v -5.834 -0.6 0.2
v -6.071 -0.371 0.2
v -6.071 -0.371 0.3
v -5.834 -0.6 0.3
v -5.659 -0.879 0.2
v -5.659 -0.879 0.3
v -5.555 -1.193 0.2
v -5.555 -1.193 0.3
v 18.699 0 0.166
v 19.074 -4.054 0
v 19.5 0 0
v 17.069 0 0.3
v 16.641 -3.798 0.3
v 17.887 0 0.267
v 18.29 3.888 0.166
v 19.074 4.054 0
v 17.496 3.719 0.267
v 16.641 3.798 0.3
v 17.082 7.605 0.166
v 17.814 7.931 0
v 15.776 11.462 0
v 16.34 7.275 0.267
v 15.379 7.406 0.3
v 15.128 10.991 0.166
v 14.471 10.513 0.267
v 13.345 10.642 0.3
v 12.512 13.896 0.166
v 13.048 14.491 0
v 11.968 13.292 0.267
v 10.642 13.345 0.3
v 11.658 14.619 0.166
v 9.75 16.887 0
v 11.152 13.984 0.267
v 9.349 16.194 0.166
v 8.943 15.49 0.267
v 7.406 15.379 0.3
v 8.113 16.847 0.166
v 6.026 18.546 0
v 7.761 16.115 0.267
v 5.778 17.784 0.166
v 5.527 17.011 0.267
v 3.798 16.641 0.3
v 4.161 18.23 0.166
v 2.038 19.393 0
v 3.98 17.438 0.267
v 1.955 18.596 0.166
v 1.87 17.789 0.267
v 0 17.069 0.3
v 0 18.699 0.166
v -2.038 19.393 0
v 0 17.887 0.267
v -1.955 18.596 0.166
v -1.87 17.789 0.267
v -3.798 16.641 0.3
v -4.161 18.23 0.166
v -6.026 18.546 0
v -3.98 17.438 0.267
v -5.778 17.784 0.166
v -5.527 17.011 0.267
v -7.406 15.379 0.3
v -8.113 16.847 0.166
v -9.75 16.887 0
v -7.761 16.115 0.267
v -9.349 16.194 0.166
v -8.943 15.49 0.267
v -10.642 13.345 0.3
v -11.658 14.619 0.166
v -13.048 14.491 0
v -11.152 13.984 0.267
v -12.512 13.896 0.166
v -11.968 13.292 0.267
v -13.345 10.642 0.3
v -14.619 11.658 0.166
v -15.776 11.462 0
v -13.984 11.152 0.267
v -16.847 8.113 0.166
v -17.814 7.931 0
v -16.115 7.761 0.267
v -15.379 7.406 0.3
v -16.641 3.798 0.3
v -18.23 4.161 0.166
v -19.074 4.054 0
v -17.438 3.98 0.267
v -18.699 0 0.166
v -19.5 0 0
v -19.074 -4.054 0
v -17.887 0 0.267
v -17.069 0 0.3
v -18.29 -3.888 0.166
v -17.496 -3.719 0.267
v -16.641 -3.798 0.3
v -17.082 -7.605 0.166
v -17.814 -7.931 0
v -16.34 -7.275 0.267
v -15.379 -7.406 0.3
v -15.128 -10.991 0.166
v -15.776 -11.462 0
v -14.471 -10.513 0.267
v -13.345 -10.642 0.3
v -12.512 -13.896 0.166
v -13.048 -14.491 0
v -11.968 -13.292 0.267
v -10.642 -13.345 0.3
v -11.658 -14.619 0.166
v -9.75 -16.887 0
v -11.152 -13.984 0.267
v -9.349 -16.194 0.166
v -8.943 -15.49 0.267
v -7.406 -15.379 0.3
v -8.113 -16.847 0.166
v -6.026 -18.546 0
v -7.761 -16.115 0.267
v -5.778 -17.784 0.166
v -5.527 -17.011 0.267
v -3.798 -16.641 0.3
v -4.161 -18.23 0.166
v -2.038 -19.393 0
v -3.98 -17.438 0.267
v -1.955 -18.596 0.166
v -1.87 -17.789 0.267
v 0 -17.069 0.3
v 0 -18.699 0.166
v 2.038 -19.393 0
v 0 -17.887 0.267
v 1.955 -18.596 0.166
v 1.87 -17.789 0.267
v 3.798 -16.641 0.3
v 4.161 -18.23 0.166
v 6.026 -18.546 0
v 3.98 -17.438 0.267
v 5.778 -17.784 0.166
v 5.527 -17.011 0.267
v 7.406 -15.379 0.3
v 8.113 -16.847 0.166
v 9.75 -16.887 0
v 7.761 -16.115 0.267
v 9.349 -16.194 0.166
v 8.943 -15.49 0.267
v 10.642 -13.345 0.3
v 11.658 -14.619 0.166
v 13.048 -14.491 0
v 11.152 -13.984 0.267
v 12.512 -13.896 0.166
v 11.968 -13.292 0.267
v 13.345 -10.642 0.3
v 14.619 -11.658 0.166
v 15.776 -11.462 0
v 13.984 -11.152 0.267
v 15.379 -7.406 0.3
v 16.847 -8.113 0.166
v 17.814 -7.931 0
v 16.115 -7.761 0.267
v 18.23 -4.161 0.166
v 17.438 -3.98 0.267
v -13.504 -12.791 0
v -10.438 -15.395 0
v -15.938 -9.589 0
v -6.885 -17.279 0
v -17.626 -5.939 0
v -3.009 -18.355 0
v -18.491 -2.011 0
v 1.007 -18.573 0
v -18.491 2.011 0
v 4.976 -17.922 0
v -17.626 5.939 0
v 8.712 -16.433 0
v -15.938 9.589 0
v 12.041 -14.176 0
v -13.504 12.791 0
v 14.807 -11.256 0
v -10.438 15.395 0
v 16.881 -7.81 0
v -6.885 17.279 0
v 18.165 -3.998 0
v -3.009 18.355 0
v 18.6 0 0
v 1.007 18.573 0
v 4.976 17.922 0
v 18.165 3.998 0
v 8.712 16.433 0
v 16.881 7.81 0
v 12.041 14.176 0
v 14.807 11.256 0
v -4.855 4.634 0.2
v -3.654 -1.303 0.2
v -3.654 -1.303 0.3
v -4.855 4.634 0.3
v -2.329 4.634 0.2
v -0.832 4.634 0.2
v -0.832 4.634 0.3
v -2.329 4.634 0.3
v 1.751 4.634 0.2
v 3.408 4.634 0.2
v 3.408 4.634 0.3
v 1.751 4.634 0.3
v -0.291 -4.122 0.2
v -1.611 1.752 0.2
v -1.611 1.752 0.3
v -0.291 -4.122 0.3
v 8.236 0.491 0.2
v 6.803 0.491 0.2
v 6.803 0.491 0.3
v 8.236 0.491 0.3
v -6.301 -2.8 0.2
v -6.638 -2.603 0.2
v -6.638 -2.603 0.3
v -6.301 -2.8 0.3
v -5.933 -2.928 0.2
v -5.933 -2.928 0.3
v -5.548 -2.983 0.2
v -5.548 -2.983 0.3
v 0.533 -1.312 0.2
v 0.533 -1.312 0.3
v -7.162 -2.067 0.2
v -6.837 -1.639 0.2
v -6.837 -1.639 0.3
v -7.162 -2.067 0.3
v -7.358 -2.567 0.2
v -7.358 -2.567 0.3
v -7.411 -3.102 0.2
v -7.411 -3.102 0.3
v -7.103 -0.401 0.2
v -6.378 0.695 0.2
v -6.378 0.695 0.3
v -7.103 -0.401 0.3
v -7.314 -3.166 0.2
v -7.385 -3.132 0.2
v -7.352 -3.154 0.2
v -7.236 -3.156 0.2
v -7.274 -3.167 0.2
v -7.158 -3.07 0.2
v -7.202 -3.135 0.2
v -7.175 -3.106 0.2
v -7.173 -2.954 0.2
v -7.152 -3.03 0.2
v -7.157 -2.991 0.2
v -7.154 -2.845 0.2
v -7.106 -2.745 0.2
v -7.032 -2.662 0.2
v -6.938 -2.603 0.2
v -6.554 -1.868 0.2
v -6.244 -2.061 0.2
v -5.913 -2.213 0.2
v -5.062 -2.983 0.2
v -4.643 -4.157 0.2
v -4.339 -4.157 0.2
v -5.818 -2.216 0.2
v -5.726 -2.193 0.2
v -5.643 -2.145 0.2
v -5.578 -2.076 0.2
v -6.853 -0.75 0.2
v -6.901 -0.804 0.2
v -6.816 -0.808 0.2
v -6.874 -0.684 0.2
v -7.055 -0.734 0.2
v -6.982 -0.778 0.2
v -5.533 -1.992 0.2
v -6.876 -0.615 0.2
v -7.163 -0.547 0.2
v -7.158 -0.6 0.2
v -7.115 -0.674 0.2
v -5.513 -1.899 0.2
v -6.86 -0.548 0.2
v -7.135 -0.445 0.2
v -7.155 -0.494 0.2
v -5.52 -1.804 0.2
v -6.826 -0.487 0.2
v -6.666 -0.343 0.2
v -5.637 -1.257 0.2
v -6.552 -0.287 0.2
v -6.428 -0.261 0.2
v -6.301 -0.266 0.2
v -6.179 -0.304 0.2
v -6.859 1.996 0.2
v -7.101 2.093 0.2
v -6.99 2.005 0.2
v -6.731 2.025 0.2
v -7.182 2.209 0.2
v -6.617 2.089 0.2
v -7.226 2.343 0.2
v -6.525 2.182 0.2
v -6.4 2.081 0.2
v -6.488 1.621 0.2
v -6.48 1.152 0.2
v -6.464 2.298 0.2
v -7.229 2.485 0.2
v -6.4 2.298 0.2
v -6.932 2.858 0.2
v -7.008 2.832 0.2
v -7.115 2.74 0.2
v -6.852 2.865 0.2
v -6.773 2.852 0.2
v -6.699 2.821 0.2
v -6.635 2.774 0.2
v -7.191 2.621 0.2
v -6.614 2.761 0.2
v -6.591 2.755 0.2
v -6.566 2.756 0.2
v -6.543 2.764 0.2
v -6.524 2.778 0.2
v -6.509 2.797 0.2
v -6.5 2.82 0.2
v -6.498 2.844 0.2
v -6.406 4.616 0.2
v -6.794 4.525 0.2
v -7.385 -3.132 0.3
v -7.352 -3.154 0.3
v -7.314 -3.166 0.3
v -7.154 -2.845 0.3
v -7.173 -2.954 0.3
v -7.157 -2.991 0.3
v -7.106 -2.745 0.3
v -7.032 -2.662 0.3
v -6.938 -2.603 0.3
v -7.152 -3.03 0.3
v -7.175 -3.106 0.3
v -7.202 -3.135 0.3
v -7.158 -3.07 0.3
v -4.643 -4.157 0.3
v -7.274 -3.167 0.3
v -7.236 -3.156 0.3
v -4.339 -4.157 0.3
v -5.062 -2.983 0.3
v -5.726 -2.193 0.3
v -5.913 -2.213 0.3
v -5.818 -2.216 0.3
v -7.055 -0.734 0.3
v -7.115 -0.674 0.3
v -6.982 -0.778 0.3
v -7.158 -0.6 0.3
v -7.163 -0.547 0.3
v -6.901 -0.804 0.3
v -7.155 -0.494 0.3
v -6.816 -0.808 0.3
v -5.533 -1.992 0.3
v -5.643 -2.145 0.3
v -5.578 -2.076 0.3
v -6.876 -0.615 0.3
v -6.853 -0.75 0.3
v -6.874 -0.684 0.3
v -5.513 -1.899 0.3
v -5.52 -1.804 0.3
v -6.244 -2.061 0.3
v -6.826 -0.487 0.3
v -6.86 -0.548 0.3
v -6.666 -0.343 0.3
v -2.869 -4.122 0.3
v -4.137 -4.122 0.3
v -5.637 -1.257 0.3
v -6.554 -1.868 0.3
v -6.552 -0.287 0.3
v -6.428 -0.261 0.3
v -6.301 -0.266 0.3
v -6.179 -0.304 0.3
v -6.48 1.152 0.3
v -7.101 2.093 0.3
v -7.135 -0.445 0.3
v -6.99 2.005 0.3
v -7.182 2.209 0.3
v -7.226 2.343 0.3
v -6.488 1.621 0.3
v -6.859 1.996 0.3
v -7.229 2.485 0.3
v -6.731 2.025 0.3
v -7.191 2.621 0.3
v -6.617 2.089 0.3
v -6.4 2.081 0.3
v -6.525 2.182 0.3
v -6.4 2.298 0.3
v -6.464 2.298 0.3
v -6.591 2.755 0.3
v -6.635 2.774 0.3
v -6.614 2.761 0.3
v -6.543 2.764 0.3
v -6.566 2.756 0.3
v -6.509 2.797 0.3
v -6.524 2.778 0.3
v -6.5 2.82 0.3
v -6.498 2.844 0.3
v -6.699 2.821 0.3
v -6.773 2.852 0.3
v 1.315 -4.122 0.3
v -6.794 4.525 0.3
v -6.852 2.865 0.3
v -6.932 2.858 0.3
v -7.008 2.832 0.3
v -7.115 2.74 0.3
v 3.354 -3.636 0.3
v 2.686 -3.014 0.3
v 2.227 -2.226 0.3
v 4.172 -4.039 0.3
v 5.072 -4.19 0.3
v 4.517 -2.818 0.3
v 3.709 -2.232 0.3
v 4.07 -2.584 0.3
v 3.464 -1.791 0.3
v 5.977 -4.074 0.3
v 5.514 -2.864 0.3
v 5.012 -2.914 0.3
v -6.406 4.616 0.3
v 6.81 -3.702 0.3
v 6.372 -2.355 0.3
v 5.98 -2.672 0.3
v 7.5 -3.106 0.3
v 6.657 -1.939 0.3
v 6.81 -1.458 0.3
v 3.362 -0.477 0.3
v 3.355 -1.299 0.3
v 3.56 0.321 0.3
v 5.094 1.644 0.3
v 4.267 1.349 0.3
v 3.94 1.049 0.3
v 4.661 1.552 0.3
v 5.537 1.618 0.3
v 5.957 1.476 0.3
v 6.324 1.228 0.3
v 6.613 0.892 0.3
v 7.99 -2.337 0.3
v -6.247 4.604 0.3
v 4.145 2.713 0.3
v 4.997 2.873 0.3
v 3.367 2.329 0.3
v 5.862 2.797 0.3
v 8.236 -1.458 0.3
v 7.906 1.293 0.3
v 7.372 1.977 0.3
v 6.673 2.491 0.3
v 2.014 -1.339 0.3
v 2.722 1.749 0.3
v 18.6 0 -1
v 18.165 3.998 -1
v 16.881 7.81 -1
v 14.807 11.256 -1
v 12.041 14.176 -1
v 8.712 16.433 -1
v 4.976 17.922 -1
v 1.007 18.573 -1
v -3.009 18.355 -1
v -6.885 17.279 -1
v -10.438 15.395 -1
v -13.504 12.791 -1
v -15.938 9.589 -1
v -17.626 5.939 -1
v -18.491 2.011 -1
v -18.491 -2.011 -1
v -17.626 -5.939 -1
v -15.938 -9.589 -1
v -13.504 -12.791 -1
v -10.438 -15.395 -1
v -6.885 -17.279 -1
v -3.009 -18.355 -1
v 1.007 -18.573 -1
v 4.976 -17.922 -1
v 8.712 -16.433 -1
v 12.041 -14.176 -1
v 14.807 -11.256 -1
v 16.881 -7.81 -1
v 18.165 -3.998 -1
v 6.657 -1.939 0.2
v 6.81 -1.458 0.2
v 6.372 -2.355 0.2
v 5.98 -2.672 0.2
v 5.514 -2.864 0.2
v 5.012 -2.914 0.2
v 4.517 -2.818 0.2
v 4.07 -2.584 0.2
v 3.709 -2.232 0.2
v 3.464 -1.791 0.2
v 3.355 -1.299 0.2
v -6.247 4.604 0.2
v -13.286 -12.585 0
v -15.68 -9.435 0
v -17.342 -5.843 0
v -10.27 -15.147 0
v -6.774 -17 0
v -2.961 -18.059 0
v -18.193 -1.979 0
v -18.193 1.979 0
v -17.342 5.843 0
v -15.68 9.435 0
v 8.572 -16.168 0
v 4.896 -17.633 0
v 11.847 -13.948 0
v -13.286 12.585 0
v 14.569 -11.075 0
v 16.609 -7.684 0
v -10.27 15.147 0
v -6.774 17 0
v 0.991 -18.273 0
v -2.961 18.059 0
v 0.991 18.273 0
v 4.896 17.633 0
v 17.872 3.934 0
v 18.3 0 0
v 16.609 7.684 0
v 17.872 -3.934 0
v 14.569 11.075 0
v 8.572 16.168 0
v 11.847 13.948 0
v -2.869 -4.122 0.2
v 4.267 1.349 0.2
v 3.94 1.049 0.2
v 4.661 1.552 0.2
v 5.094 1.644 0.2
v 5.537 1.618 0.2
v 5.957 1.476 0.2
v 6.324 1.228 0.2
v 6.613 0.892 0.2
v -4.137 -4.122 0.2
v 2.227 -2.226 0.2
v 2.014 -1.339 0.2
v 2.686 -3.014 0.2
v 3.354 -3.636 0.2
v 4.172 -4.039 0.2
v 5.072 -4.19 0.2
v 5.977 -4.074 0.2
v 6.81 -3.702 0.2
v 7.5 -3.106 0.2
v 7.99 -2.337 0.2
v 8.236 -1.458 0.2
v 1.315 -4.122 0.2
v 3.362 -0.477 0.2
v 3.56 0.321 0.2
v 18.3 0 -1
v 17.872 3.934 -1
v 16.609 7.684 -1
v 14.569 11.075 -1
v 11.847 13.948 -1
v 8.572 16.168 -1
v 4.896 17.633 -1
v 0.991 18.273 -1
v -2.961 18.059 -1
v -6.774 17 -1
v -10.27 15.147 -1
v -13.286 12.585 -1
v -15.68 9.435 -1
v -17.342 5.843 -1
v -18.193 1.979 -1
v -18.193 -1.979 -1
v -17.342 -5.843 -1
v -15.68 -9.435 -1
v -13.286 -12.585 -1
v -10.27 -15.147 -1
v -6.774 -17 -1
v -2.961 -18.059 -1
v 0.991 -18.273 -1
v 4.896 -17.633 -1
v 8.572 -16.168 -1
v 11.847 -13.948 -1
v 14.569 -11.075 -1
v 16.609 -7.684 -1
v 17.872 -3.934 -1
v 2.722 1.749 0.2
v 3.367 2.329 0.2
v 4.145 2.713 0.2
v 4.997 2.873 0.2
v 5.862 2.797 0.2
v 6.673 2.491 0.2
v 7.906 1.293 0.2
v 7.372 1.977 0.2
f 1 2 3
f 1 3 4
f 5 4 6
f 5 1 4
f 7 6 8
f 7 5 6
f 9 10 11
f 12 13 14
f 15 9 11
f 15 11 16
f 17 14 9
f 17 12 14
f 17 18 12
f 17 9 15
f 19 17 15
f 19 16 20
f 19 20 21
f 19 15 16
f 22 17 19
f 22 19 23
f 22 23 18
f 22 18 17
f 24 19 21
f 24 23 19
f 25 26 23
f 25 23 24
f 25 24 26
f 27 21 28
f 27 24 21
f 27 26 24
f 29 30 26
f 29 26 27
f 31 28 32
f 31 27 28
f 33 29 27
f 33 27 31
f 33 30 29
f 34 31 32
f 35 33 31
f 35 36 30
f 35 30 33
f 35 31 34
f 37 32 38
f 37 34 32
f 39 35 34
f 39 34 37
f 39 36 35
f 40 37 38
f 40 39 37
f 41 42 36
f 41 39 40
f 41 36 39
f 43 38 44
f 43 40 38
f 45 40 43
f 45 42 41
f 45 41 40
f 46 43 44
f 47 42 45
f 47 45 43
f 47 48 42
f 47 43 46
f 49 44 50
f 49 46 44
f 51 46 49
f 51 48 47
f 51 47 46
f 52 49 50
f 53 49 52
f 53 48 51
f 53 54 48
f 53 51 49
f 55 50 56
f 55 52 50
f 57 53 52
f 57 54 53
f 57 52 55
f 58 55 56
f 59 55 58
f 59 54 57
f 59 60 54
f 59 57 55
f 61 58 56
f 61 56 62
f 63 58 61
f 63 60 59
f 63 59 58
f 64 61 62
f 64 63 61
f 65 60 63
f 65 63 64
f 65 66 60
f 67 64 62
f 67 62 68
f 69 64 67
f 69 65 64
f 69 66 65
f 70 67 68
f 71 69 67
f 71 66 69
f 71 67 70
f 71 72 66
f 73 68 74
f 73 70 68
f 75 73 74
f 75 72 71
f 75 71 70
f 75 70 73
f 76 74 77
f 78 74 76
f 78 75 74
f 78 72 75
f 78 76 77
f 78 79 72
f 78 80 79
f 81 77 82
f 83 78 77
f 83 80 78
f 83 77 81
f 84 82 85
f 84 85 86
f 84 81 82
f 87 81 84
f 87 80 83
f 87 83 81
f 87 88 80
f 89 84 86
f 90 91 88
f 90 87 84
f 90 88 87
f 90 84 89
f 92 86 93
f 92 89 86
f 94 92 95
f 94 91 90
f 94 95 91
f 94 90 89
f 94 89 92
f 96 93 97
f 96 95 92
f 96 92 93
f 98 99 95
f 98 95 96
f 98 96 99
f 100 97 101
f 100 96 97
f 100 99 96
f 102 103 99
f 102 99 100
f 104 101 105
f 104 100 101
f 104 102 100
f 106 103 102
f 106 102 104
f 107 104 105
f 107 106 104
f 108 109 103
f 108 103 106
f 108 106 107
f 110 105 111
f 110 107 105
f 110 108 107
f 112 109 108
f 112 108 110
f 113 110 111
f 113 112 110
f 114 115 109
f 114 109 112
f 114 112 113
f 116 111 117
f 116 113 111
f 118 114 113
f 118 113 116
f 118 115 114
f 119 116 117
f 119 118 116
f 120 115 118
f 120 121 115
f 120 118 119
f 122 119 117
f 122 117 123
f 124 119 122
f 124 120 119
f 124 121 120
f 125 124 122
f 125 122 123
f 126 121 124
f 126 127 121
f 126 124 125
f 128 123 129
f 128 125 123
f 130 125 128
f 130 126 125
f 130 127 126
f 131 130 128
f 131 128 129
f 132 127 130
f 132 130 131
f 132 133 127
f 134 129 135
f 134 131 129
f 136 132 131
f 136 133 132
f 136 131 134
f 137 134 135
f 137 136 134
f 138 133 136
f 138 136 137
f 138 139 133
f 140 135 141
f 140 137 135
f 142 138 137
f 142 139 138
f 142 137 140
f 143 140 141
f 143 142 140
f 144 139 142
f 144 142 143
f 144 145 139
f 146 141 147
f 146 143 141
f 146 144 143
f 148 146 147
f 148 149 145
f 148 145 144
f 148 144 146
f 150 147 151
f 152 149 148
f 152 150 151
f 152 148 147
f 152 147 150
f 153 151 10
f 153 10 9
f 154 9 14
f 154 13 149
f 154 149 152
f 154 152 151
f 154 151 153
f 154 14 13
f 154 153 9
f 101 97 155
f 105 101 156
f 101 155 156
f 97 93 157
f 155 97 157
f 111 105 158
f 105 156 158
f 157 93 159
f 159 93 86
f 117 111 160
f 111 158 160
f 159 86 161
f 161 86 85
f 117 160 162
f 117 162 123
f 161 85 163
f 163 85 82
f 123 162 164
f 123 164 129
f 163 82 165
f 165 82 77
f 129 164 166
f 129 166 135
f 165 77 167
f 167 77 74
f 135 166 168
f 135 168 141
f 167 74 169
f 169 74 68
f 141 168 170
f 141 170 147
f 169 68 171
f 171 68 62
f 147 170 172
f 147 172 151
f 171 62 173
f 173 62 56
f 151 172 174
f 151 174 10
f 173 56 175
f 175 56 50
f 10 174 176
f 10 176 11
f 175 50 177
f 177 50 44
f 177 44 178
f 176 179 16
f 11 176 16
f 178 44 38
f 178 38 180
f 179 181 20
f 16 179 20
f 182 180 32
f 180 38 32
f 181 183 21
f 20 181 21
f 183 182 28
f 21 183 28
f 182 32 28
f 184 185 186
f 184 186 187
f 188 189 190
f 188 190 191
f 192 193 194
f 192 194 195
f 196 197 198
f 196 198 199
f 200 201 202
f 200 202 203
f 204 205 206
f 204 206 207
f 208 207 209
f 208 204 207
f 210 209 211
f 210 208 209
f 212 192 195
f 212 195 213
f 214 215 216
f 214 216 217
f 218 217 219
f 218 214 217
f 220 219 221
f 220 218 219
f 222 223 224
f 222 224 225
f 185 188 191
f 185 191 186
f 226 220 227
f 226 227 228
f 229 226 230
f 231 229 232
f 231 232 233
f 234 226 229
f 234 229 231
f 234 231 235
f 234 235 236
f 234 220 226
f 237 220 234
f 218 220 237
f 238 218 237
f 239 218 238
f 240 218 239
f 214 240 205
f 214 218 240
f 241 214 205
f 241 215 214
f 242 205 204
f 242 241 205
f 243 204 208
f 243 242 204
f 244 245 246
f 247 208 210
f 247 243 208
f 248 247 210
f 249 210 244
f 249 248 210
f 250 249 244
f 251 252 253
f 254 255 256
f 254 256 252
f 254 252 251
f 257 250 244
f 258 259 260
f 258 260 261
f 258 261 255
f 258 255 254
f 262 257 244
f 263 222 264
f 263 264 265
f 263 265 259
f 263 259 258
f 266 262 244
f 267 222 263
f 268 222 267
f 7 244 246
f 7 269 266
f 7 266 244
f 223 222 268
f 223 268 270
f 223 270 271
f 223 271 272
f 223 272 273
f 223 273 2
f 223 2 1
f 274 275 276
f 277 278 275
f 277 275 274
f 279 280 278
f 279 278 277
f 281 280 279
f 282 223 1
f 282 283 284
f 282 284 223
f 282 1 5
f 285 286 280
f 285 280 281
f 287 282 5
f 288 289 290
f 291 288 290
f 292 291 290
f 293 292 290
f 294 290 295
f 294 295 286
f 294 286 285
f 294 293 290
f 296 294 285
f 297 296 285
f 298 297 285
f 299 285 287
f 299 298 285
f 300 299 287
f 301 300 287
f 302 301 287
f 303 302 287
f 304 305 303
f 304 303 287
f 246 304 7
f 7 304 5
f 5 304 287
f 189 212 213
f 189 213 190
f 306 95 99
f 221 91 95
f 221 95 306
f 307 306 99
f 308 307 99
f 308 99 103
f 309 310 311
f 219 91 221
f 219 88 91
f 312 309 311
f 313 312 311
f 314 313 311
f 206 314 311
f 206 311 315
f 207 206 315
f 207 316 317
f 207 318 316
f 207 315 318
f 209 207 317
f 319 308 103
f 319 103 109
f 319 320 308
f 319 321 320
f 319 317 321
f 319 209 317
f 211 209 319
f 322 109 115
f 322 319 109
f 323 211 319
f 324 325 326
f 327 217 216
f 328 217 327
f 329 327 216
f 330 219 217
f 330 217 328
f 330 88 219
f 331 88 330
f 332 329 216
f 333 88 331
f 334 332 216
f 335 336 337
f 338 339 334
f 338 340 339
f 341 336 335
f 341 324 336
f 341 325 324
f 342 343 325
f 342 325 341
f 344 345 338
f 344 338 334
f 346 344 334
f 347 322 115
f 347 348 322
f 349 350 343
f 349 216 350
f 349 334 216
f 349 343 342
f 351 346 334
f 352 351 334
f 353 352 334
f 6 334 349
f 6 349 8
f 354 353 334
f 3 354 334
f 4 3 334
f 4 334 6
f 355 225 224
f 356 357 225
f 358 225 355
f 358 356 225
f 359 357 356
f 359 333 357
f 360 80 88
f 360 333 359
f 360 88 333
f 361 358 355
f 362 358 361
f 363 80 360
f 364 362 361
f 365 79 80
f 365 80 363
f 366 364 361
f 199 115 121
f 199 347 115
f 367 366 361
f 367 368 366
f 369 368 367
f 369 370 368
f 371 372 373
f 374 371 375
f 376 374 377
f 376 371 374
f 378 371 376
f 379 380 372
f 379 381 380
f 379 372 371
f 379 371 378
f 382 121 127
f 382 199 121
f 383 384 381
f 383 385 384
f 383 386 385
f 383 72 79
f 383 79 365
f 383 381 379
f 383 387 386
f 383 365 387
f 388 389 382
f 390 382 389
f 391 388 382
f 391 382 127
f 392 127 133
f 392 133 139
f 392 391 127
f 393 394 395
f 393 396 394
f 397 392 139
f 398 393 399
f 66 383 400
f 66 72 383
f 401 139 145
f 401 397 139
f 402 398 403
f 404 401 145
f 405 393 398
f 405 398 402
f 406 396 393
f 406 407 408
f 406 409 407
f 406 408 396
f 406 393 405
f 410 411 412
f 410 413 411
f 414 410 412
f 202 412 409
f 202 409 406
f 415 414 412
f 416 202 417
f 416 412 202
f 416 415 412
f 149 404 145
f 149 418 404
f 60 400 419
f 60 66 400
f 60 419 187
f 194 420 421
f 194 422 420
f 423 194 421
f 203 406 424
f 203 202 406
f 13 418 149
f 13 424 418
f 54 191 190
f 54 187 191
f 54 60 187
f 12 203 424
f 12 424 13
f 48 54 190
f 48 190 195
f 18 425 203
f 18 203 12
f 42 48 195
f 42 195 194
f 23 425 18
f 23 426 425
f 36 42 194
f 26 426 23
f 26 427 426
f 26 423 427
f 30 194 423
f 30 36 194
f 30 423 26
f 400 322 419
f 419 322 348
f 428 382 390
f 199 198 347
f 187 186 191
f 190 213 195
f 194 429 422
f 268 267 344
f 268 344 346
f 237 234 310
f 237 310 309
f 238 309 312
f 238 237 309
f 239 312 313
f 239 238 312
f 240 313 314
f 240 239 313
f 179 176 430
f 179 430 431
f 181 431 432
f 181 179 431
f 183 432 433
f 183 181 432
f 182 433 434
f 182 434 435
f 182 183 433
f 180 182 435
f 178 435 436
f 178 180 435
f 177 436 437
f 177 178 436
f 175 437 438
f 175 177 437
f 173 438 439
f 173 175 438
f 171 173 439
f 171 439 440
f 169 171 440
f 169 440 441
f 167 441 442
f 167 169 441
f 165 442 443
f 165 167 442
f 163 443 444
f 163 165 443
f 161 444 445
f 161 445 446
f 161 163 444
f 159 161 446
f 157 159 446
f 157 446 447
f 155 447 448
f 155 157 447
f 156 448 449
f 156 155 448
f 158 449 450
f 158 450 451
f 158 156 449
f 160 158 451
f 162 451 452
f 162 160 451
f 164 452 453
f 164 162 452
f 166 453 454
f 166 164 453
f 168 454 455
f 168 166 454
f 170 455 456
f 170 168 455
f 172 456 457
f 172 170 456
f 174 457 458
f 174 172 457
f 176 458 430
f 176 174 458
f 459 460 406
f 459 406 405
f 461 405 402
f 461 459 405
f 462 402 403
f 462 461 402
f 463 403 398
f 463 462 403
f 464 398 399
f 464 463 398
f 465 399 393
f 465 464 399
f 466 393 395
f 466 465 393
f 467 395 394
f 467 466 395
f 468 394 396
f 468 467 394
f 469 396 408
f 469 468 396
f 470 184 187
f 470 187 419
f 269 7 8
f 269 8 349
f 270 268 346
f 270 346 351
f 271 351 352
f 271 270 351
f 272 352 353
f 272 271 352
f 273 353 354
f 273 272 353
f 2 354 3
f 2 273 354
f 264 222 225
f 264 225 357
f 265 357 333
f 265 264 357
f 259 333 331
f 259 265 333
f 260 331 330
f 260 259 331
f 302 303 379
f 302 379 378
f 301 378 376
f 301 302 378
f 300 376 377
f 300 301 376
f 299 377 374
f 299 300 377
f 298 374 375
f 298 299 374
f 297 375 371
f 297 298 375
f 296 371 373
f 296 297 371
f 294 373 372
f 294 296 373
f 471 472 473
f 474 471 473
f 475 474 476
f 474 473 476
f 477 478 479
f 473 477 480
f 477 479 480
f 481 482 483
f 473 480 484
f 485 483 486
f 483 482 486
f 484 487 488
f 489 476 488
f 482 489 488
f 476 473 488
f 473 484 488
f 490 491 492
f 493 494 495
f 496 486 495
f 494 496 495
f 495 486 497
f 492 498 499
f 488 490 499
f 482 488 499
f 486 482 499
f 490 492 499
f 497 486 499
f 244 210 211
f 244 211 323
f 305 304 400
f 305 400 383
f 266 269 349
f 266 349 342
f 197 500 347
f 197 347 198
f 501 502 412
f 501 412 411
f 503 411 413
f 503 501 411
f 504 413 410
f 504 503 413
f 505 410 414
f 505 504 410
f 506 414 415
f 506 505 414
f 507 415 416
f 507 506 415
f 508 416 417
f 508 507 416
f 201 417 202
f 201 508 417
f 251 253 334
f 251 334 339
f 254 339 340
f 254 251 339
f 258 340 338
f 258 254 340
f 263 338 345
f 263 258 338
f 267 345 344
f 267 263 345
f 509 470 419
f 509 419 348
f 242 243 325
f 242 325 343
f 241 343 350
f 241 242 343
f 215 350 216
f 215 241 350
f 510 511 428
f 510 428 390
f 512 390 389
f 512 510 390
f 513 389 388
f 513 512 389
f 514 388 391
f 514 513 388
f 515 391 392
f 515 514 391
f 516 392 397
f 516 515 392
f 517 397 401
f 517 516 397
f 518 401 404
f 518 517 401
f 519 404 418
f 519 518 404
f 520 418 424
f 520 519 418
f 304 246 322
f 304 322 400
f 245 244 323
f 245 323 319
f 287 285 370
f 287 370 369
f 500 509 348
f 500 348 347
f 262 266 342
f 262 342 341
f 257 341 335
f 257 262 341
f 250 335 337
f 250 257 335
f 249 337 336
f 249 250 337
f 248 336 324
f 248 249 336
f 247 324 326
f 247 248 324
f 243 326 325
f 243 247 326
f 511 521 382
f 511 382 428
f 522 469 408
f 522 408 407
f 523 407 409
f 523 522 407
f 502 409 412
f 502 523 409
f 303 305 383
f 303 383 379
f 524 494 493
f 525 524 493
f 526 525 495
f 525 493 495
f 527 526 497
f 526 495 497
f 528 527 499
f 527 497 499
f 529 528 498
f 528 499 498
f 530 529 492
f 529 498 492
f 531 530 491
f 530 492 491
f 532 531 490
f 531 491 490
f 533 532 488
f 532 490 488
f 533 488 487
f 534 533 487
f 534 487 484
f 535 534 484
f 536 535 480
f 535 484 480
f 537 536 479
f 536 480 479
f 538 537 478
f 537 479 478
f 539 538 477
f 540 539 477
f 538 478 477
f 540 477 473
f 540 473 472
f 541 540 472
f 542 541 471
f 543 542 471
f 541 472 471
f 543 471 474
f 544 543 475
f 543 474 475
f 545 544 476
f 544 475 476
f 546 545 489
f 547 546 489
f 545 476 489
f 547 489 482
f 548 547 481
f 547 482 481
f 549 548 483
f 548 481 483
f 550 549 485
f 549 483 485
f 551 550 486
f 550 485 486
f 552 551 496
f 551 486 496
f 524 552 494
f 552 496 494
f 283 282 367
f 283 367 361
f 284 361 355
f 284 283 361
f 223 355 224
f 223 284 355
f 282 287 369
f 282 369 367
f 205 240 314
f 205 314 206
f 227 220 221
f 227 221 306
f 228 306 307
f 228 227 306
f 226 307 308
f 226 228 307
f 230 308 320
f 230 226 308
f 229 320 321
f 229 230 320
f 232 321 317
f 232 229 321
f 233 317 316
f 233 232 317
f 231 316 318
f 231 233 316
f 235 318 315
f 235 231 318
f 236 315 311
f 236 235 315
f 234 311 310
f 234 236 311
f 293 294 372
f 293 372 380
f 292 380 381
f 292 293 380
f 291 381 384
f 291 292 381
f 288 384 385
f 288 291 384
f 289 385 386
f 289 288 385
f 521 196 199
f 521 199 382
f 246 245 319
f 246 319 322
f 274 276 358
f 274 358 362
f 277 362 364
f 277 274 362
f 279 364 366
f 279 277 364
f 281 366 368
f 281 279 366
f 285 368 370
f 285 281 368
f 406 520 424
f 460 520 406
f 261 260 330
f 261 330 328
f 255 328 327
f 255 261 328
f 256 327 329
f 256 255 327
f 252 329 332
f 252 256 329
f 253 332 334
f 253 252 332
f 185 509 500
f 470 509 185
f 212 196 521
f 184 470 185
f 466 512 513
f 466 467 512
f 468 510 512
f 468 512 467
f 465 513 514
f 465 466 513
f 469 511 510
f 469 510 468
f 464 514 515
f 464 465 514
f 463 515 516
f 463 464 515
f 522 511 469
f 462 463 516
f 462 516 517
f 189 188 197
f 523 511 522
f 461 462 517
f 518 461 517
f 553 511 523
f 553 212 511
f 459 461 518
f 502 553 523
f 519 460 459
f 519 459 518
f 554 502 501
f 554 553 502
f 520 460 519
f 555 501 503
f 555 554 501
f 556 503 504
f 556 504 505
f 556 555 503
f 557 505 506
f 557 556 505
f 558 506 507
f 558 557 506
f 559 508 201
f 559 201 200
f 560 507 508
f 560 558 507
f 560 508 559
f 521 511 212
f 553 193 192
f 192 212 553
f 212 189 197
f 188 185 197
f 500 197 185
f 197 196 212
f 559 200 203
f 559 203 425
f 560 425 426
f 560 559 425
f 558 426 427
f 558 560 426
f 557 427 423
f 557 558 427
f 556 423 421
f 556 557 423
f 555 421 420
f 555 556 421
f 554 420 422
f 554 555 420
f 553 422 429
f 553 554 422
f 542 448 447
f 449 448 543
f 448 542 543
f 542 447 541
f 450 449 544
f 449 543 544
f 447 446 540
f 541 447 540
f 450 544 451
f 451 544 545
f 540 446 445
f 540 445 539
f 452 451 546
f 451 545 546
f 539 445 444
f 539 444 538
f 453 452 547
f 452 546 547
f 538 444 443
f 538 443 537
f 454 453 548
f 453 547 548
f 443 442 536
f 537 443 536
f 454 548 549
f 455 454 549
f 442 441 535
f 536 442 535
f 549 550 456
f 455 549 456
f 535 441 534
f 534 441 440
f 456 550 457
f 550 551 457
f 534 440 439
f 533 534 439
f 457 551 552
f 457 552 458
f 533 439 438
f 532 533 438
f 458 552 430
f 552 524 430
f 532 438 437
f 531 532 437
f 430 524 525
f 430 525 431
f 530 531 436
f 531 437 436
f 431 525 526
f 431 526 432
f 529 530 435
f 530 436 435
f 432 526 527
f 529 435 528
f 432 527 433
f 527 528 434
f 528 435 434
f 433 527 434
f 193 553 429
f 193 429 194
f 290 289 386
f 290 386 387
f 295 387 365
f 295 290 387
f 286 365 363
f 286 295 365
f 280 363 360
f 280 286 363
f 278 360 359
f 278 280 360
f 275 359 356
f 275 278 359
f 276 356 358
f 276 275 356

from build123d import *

# Parameters (mm, degrees)
SKETCH1_R           = 19.5
BOSS_EXTRUDE1_DEPTH = 0.3
SKETCH1_3_R         = 18.6
SKETCH1_3_R_2       = 18.3
BOSS_EXTRUDE2_DEPTH = 1
FILLET1_R           = 10
CUT_EXTRUDE1_START  = -0.1
CUT_EXTRUDE1_DEPTH  = 0.1


# Read off the part's stored shape, not the designer's step: Cut-Extrude1
with BuildPart() as part:
    # Sketch1 → Boss-Extrude1 (new body)
    with BuildSketch(Plane.XY):
        Circle(SKETCH1_R)
    extrude(amount=BOSS_EXTRUDE1_DEPTH)

    # Sketch1<3> → Boss-Extrude2 (add)
    with BuildSketch(Plane.XY):
        Circle(SKETCH1_3_R)
        Circle(SKETCH1_3_R_2, mode=Mode.SUBTRACT)
    extrude(amount=-BOSS_EXTRUDE2_DEPTH)

    # Fillet1
    # the kernel refuses this fillet: 10 mm, written as the material it takes off along each edge
    with BuildSketch(Plane(origin=(0, 0, 0.3), x_dir=(1, 0, 0), z_dir=(0, -1, 0))) as fillet1_piece_1:
        with BuildLine():
            CenterArc((17.068950844, -10), FILLET1_R, 75.930132252, 14.069867748)
            Line((17.068950844, 0), (17.068950844, 0.2))
            Line((17.068950844, 0.2), (19.5, 0.2))
            Line((19.5, 0.2), (19.7, 0))
            ThreePointArc((19.7, 0), (19.7, -0.15), (19.548620983, -0.106))
            Line((19.548620983, -0.106), (19.5, -0.3))
        make_face()
    revolve(axis=Axis((0, 0, 0.3), (0, 0, 1)), mode=Mode.SUBTRACT)

    # Cut-Extrude1 outline → Cut-Extrude1 (cut)
    with BuildSketch(Plane.XY.offset(0.3).offset(CUT_EXTRUDE1_START)):
        with BuildLine():
            Line((1.315411857, -4.122498151), (2.014314535, -1.338720024))
            ThreePointArc((2.014314535, -1.338720024), (5.071648244, -4.189541516), (8.236226494, -1.458256637))
            Line((8.236226494, -1.458256637), (6.810434555, -1.458256637))
            ThreePointArc((6.810434555, -1.458256637), (5.012044187, -2.913884745), (3.355418791, -1.298752119))
            ThreePointArc((3.355418791, -1.298752119), (3.437417537, -0.072322093), (3.940070016, 1.049370774))
            ThreePointArc((3.940070016, 1.049370774), (5.536779658, 1.617570868), (6.80295626, 0.491014238))
            Line((6.80295626, 0.491014238), (8.236226494, 0.491014238))
            ThreePointArc((8.236226494, 0.491014238), (5.861564417, 2.797023993), (2.721821376, 1.74882811))
            Line((2.721821376, 1.74882811), (3.407587296, 4.634399496))
            Line((3.407587296, 4.634399496), (1.750846599, 4.634399496))
            Line((1.750846599, 4.634399496), (0.532539724, -1.311746329))
            Line((0.532539724, -1.311746329), (-0.832013668, 4.634399496))
            Line((-0.832013668, 4.634399496), (-2.328745068, 4.634399496))
            Line((-2.328745068, 4.634399496), (-3.653616427, -1.303011789))
            Line((-3.653616427, -1.303011789), (-4.854525711, 4.634399496))
            Line((-4.854525711, 4.634399496), (-6.247187009, 4.603807508))
            Line((-6.247187009, 4.603807508), (-4.13707531, -4.122498151))
            Line((-4.13707531, -4.122498151), (-2.868545937, -4.122498151))
            Line((-2.868545937, -4.122498151), (-1.610862761, 1.75217424))
            Line((-1.610862761, 1.75217424), (-0.291169429, -4.122498151))
            Line((-0.291169429, -4.122498151), (1.315411857, -4.122498151))
        make_face()
        with BuildLine():
            Line((-6.937538905, -2.602863273), (-6.637674337, -2.602863273))
            ThreePointArc((-6.637674337, -2.602863273), (-6.120559929, -2.872899906), (-5.547687427, -2.983100592))
            Line((-5.547687427, -2.983100592), (-5.062190332, -2.983100592))
            Line((-5.062190332, -2.983100592), (-4.643328191, -4.157083976))
            Line((-4.643328191, -4.157083976), (-4.338702943, -4.157083976))
            Line((-4.338702943, -4.157083976), (-6.406435712, 4.616022013))
            Line((-6.406435712, 4.616022013), (-6.794480732, 4.524563708))
            Line((-6.794480732, 4.524563708), (-6.497707451, 2.844057166))
            ThreePointArc((-6.497707451, 2.844057166), (-6.543403682, 2.764133189), (-6.634976133, 2.773644958))
            ThreePointArc((-6.634976133, 2.773644958), (-6.812471334, 2.860826812), (-7.00818234, 2.832499724))
            ThreePointArc((-7.00818234, 2.832499724), (-7.232944109, 2.4137084), (-6.990239601, 2.005053843))
            ThreePointArc((-6.990239601, 2.005053843), (-6.671904577, 2.052546685), (-6.464198285, 2.298414239))
            Line((-6.464198285, 2.298414239), (-6.400014039, 2.298414239))
            Line((-6.400014039, 2.298414239), (-6.400014039, 2.081303951))
            ThreePointArc((-6.400014039, 2.081303951), (-6.496019237, 1.38621962), (-6.377516068, 0.694615526))
            Line((-6.377516068, 0.694615526), (-7.103342547, -0.4012317))
            ThreePointArc((-7.103342547, -0.4012317), (-7.155024922, -0.494114517), (-7.158413077, -0.600353898))
            ThreePointArc((-7.158413077, -0.600353898), (-7.020194568, -0.758643223), (-6.815959597, -0.808119916))
            ThreePointArc((-6.815959597, -0.808119916), (-6.877232982, -0.649384136), (-6.826115409, -0.487092826))
            Line((-6.826115409, -0.487092826), (-6.666005475, -0.342790453))
            ThreePointArc((-6.666005475, -0.342790453), (-6.364107135, -0.25949819), (-6.071279663, -0.37054899))
            ThreePointArc((-6.071279663, -0.37054899), (-5.738084346, -0.734492432), (-5.554908519, -1.192663322))
            Line((-5.554908519, -1.192663322), (-5.636587076, -1.257125772))
            Line((-5.636587076, -1.257125772), (-5.52013275, -1.803631749))
            ThreePointArc((-5.52013275, -1.803631749), (-5.60809608, -2.112628848), (-5.913172695, -2.213351306))
            ThreePointArc((-5.913172695, -2.213351306), (-6.401983276, -1.969270784), (-6.837380228, -1.639209304))
            ThreePointArc((-6.837380228, -1.639209304), (-7.277778062, -2.310157247), (-7.410559234, -3.101668811))
            ThreePointArc((-7.410559234, -3.101668811), (-7.217893073, -3.146992956), (-7.172568928, -2.954326795))
            ThreePointArc((-7.172568928, -2.954326795), (-7.105944543, -2.74456355), (-6.937538905, -2.602863273))
        make_face()
    extrude(amount=CUT_EXTRUDE1_DEPTH, mode=Mode.SUBTRACT)


solid = part.part
